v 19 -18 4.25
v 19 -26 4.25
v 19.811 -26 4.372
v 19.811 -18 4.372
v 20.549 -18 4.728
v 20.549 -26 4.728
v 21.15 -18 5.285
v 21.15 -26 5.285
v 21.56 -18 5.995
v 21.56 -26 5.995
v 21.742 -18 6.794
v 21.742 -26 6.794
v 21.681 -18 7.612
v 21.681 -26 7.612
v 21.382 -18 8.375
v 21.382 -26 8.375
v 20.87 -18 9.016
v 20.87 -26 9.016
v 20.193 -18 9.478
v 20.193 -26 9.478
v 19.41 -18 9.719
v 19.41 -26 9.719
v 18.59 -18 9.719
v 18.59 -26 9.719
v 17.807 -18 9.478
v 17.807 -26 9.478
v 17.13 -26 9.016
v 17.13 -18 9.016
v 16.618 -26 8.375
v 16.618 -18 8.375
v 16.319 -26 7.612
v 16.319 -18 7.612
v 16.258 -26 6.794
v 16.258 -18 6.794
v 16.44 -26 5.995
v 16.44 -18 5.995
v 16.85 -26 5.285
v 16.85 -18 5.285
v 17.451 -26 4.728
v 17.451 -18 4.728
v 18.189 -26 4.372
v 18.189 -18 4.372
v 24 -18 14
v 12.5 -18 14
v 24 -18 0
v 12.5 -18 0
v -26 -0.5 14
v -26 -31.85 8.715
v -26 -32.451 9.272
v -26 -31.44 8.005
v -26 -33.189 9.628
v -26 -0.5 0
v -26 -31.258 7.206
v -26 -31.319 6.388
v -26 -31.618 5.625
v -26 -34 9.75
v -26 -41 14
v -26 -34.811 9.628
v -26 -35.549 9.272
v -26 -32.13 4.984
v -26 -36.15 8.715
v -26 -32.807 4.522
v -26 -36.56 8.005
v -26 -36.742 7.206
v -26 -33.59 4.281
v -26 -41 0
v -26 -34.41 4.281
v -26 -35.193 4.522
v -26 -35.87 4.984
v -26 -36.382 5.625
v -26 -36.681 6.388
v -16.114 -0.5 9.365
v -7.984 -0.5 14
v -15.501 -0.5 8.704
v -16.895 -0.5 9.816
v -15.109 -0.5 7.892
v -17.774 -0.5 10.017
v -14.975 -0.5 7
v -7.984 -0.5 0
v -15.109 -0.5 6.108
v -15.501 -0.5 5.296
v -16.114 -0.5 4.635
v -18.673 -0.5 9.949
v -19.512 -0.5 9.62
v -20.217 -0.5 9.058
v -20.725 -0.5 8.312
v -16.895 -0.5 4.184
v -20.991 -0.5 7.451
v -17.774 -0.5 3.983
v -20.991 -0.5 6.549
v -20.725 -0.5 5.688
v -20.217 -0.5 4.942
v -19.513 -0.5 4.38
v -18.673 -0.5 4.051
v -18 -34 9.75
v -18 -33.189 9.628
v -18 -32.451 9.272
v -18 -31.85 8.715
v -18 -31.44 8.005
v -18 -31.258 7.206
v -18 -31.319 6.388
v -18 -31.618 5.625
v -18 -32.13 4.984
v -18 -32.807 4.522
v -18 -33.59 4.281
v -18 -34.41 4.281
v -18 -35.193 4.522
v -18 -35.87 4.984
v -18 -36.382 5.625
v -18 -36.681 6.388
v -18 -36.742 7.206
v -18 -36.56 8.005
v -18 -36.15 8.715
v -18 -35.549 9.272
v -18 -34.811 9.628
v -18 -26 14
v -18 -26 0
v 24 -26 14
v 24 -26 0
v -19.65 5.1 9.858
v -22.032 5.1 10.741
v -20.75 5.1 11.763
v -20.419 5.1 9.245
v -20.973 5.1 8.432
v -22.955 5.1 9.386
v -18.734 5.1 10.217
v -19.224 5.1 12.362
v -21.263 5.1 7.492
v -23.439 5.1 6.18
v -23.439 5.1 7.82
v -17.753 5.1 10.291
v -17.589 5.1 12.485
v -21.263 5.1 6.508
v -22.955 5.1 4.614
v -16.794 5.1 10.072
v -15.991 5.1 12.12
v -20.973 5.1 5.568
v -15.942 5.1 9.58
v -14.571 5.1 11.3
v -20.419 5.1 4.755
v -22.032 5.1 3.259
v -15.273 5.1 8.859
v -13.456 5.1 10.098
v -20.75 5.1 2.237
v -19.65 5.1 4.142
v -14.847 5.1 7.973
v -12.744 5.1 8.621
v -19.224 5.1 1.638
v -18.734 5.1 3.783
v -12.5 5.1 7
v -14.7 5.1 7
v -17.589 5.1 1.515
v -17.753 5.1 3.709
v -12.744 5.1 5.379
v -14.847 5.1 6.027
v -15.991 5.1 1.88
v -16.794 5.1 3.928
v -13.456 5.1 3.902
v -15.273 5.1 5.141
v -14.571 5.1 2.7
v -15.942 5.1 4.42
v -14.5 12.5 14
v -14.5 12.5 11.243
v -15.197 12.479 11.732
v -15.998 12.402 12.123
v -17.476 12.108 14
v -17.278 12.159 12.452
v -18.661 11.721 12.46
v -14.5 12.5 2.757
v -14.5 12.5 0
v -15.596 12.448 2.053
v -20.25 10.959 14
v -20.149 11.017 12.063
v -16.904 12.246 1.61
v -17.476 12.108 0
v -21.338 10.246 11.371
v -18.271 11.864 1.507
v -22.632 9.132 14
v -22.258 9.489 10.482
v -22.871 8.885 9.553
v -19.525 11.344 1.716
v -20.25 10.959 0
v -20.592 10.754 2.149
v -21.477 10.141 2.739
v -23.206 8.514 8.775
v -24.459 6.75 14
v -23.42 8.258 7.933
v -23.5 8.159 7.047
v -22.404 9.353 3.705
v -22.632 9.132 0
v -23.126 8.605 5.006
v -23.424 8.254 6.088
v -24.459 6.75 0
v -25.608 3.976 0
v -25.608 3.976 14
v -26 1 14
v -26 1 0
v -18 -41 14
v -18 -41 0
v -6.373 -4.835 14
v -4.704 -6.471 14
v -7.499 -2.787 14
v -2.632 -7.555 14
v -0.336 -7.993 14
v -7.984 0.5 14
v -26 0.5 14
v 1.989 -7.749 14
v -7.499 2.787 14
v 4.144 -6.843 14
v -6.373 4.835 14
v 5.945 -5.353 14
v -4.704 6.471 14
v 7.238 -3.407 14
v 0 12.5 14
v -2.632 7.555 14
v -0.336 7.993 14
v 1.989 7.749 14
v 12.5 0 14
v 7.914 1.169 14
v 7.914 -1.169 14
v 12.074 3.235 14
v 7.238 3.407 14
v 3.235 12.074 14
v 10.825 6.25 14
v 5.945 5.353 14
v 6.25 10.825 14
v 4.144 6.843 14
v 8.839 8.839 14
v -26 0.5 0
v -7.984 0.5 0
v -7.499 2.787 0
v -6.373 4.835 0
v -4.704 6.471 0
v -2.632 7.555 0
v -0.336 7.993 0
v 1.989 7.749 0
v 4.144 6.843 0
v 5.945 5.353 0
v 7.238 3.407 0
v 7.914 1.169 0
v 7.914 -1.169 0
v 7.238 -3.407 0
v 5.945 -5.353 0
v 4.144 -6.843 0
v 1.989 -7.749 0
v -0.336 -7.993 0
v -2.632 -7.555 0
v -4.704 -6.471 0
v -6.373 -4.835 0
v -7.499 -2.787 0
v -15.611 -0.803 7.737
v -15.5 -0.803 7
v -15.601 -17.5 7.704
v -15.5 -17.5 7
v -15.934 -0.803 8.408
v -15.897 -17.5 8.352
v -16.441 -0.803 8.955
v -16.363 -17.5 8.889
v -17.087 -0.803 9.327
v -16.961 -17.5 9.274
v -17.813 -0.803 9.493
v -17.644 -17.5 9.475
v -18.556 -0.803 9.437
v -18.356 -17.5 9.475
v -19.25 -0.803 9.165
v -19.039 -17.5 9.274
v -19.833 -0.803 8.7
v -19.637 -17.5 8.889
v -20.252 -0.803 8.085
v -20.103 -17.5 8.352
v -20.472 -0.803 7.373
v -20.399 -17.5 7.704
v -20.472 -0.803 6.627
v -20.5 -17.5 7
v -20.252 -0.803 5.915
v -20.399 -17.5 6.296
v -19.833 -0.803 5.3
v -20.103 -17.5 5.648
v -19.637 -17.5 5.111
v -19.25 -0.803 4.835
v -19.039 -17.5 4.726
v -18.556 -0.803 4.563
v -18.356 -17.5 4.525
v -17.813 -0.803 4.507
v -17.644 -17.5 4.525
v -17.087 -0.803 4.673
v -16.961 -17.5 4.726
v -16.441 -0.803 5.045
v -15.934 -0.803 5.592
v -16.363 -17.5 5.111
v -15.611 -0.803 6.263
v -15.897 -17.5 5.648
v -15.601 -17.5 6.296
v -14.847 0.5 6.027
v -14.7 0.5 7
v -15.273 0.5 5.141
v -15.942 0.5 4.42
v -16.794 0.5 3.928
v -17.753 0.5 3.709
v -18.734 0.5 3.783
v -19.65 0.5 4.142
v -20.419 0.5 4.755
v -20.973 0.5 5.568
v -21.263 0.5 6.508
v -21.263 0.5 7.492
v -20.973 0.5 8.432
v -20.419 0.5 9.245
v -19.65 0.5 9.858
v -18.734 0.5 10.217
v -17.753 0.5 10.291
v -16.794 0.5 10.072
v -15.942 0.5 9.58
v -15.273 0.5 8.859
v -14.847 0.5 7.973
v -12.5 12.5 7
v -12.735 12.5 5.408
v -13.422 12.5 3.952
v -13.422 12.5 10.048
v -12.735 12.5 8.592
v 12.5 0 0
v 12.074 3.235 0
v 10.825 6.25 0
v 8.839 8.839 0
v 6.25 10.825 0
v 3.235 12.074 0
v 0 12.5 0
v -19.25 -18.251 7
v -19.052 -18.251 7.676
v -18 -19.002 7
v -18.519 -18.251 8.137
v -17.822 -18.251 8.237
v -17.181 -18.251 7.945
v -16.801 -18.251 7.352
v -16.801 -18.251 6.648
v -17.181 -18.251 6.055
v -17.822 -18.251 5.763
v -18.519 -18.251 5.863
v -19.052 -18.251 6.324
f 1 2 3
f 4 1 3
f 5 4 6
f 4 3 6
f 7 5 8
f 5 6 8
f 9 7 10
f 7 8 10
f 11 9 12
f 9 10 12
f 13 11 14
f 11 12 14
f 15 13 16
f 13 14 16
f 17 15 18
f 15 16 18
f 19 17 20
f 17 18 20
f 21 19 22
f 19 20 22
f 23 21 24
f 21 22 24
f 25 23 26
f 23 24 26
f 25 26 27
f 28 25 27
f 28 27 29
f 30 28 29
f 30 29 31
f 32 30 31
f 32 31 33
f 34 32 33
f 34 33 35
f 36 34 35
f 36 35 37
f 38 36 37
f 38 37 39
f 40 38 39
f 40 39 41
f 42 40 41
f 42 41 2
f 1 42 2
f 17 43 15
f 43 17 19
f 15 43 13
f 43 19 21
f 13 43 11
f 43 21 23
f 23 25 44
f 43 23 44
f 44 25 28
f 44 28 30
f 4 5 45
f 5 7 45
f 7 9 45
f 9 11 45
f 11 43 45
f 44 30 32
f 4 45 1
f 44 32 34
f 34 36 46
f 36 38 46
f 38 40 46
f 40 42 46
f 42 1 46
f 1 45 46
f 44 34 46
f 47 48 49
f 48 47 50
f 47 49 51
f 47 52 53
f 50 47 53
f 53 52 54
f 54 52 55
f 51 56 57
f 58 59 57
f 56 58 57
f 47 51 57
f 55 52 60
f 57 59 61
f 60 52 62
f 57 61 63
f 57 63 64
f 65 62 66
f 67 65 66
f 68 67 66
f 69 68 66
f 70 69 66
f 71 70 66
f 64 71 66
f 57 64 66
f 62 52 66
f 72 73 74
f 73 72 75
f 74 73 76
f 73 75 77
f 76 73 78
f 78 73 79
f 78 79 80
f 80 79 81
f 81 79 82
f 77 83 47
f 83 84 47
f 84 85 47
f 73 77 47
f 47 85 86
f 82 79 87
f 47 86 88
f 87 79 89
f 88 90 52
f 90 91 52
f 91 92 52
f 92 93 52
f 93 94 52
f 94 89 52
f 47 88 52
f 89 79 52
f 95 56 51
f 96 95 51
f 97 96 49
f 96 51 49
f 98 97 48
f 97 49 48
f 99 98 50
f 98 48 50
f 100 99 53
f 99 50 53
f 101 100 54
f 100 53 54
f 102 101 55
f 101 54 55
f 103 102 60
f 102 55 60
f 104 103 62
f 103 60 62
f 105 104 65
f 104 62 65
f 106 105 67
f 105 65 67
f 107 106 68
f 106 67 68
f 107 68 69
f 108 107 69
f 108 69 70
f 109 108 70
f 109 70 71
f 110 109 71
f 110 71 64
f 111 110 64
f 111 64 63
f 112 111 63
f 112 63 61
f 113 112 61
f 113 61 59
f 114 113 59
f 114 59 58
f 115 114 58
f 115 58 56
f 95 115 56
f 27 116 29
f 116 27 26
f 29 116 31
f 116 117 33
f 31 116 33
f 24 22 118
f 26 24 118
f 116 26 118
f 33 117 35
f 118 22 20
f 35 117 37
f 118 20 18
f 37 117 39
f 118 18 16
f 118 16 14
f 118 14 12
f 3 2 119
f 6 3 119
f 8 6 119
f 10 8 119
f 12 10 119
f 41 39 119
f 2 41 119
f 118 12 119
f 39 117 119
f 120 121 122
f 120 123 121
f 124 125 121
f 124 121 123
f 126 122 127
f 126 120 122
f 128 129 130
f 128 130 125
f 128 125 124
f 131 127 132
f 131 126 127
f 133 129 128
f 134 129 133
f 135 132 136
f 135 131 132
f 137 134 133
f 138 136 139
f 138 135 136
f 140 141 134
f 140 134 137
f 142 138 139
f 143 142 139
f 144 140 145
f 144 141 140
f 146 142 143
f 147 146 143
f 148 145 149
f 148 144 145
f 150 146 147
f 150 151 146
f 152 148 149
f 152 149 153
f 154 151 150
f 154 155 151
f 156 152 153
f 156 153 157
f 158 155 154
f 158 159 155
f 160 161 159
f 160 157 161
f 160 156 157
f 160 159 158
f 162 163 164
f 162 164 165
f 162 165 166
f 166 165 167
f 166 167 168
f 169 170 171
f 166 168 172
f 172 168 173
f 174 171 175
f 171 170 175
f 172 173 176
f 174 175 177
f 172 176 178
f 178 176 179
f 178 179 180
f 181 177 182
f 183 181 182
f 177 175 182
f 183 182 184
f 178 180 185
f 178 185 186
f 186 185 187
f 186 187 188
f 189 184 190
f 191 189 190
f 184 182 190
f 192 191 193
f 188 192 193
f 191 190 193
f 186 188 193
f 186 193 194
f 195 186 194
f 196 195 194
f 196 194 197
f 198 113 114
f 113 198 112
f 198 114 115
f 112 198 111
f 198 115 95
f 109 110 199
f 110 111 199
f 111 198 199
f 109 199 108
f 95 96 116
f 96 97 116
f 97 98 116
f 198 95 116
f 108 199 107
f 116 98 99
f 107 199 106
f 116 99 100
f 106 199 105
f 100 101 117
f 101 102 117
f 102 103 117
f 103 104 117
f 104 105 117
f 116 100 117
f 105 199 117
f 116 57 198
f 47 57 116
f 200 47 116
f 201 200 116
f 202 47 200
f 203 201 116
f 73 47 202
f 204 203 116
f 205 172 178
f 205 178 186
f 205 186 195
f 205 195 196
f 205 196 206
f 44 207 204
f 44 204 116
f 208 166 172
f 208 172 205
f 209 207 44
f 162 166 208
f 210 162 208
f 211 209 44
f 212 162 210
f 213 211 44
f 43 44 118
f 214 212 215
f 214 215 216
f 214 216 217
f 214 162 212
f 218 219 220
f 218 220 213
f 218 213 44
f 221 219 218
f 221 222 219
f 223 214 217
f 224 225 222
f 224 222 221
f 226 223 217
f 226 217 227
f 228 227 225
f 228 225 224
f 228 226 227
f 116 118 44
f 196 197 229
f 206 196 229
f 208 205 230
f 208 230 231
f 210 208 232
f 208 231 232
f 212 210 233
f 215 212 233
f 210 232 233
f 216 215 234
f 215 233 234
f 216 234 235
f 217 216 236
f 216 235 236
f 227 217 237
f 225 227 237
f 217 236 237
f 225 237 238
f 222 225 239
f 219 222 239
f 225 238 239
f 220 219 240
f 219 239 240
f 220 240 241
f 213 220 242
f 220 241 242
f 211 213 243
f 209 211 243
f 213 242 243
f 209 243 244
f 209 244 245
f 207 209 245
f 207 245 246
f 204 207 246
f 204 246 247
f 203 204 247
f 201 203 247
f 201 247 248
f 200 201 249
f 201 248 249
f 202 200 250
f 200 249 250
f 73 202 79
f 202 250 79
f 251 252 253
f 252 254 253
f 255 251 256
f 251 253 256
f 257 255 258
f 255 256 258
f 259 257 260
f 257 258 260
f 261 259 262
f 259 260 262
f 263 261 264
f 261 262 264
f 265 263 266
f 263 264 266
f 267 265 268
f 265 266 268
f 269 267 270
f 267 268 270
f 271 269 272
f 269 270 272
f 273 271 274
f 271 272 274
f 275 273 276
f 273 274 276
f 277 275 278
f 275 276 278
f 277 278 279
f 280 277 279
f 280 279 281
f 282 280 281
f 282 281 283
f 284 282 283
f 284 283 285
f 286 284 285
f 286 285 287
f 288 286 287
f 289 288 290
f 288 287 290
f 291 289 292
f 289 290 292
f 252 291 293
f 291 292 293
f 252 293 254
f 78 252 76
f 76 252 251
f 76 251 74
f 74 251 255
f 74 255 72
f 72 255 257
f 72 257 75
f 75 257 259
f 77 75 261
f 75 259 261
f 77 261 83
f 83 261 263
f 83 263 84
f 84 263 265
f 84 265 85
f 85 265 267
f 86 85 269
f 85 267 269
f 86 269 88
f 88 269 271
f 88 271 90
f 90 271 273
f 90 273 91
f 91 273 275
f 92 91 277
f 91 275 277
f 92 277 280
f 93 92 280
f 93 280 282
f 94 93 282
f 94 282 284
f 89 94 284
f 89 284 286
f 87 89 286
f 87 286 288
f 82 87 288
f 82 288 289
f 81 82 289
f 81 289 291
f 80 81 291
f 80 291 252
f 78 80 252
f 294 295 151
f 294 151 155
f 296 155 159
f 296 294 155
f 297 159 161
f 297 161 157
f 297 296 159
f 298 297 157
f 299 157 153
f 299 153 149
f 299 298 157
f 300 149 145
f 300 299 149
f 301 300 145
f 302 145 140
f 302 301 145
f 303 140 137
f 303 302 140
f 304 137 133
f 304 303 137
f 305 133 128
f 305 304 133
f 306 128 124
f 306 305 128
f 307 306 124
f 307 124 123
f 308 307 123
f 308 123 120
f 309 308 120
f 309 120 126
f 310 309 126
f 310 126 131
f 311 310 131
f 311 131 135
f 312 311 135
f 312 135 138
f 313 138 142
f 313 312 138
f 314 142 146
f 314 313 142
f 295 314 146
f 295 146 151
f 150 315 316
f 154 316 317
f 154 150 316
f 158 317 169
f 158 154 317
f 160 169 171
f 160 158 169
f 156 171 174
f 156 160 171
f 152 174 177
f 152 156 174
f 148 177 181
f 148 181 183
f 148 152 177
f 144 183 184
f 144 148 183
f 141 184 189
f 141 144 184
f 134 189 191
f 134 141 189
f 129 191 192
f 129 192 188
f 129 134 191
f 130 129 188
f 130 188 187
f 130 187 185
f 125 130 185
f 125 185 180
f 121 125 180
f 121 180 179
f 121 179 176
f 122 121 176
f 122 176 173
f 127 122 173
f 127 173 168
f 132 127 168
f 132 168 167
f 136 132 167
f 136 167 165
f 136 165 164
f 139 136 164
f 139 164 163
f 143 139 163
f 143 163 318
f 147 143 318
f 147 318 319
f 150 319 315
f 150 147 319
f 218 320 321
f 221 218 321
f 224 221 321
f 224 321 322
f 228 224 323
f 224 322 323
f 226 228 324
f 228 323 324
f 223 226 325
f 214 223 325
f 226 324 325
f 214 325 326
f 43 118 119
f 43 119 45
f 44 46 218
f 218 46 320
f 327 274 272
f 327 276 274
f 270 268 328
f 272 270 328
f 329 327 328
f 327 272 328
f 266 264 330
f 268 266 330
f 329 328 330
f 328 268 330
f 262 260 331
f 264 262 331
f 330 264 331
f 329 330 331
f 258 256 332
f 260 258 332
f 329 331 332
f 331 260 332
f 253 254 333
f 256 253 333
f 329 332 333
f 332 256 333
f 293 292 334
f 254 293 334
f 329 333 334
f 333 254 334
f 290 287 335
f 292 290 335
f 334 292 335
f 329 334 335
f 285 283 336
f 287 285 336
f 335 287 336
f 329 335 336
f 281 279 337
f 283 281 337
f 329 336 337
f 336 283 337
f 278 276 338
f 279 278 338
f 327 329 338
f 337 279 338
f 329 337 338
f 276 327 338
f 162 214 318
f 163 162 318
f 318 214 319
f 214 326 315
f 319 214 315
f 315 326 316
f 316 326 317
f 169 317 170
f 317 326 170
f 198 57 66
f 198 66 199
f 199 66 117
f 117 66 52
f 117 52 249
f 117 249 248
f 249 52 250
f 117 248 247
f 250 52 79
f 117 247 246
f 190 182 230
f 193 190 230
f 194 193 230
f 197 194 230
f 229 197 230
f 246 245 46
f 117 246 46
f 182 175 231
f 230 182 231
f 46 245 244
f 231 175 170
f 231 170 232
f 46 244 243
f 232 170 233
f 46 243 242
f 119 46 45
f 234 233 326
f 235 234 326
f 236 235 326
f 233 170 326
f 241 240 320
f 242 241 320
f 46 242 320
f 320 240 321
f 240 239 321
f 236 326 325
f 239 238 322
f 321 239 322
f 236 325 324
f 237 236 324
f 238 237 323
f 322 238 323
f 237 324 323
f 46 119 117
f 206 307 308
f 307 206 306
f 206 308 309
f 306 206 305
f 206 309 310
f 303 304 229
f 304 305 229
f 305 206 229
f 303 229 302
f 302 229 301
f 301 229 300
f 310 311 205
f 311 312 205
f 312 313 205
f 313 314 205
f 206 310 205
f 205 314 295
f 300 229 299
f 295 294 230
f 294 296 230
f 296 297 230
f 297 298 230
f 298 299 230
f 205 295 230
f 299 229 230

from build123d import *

# Parameters (mm, degrees)
EXTRUDE_1_DEPTH               = 14
SKETCH_2_R                    = 2.75
CUT_EXTRUDE_1_DEPTH           = 49.520614176
SKETCH_3_R                    = 2.75
CUT_EXTRUDE_2_DEPTH           = 67.158899628
HOLE_START                    = 5.1
HOLE_WIZARD_M61_OUTLINE_R     = 5.5
HOLE_WIZARD_M61_DEPTH         = 7.4
HOLE_START_2                  = 0.5
HOLE_WIZARD_M61_2_OUTLINE_R   = 3.3
HOLE_WIZARD_M61_2_DEPTH       = 4.6
HOLE_WIZARD_M61_3_D           = 5
HOLE_WIZARD_M61_3_DEPTH       = 17
HOLE_WIZARD_M61_3_CSINK_D     = 6.05
HOLE_WIZARD_M61_3_CSINK_ANGLE = 120
HOLE_WIZARD_M61_3_TIP         = 1.502151548


# Read off the part's stored shape, not the designer's step: Цековка для  винта с внутренним шестигранником M61
with BuildPart() as part:
    # Эскиз1 → Бобышка-Вытянуть1 (new body)
    with BuildSketch(Plane.XY):
        with BuildLine():
            Line((-26, 0.5), (-7.984359711, 0.5))
            ThreePointArc((-7.984359711, 0.5), (8, 0), (-7.984359711, -0.5))
            Line((-7.984359711, -0.5), (-26, -0.5))
            Line((-26, -0.5), (-26, -18))
            Line((-26, -18), (-26, -26))
            Line((-26, -26), (-26, -41))
            Line((-26, -41), (-18, -41))
            Line((-18, -41), (-18, -26))
            Line((-18, -26), (24, -26))
            Line((24, -26), (24, -18))
            Line((24, -18), (12.5, -18))
            Line((12.5, -18), (12.5, 0))
            ThreePointArc((12.5, 0), (8.838834765, 8.838834765), (0, 12.5))
            Line((0, 12.5), (-14.5, 12.5))
            ThreePointArc((-14.5, 12.5), (-22.631727984, 9.131727984), (-26, 1))
            Line((-26, 1), (-26, 0.5))
        make_face()
    extrude(amount=EXTRUDE_1_DEPTH)

    # Эскиз2 → Вырез-Вытянуть1 (cut, through all)
    with BuildSketch(Plane.XZ.offset(26)):
        with Locations(Location((19, 7, 0), (0, 0, 270))):
            Circle(SKETCH_2_R)
    extrude(amount=-CUT_EXTRUDE_1_DEPTH, mode=Mode.SUBTRACT)

    # Эскиз3 → Вырез-Вытянуть2 (cut, through all)
    with BuildSketch(Plane.ZY.offset(26)):
        with Locations((7, -34)):
            Circle(SKETCH_3_R)
    extrude(amount=-CUT_EXTRUDE_2_DEPTH, mode=Mode.SUBTRACT)

    # Hole Wizard M61 outline → Hole Wizard M61 (cut)
    with BuildSketch(Plane(origin=(0, 0, 0), x_dir=(1, 0, 0), z_dir=(0, 1, 0)).offset(HOLE_START)):
        with Locations((-18, -7)):
            Circle(HOLE_WIZARD_M61_OUTLINE_R)
    extrude(amount=HOLE_WIZARD_M61_DEPTH, mode=Mode.SUBTRACT)

    # Hole Wizard M61 2 outline → Hole Wizard M61 2 (cut)
    with BuildSketch(Plane(origin=(0, 0, 0), x_dir=(1, 0, 0), z_dir=(0, 1, 0)).offset(HOLE_START_2)):
        with Locations((-18, -7)):
            Circle(HOLE_WIZARD_M61_2_OUTLINE_R)
    extrude(amount=HOLE_WIZARD_M61_2_DEPTH, mode=Mode.SUBTRACT)

    # Hole Wizard M61 3
    with Locations(Plane(origin=(0, -0.5, 0), x_dir=(-1, 0, 0), z_dir=(0, 1, 0))):
        with Locations((18, 7)):
            CounterSinkHole(HOLE_WIZARD_M61_3_D / 2, HOLE_WIZARD_M61_3_CSINK_D / 2, depth=HOLE_WIZARD_M61_3_DEPTH, counter_sink_angle=HOLE_WIZARD_M61_3_CSINK_ANGLE)
            with Locations((0, 0, -(HOLE_WIZARD_M61_3_DEPTH + HOLE_WIZARD_M61_3_TIP / 2))):  # 118° drill point
                Cone(0, HOLE_WIZARD_M61_3_D / 2, HOLE_WIZARD_M61_3_TIP, mode=Mode.SUBTRACT)


solid = part.part
